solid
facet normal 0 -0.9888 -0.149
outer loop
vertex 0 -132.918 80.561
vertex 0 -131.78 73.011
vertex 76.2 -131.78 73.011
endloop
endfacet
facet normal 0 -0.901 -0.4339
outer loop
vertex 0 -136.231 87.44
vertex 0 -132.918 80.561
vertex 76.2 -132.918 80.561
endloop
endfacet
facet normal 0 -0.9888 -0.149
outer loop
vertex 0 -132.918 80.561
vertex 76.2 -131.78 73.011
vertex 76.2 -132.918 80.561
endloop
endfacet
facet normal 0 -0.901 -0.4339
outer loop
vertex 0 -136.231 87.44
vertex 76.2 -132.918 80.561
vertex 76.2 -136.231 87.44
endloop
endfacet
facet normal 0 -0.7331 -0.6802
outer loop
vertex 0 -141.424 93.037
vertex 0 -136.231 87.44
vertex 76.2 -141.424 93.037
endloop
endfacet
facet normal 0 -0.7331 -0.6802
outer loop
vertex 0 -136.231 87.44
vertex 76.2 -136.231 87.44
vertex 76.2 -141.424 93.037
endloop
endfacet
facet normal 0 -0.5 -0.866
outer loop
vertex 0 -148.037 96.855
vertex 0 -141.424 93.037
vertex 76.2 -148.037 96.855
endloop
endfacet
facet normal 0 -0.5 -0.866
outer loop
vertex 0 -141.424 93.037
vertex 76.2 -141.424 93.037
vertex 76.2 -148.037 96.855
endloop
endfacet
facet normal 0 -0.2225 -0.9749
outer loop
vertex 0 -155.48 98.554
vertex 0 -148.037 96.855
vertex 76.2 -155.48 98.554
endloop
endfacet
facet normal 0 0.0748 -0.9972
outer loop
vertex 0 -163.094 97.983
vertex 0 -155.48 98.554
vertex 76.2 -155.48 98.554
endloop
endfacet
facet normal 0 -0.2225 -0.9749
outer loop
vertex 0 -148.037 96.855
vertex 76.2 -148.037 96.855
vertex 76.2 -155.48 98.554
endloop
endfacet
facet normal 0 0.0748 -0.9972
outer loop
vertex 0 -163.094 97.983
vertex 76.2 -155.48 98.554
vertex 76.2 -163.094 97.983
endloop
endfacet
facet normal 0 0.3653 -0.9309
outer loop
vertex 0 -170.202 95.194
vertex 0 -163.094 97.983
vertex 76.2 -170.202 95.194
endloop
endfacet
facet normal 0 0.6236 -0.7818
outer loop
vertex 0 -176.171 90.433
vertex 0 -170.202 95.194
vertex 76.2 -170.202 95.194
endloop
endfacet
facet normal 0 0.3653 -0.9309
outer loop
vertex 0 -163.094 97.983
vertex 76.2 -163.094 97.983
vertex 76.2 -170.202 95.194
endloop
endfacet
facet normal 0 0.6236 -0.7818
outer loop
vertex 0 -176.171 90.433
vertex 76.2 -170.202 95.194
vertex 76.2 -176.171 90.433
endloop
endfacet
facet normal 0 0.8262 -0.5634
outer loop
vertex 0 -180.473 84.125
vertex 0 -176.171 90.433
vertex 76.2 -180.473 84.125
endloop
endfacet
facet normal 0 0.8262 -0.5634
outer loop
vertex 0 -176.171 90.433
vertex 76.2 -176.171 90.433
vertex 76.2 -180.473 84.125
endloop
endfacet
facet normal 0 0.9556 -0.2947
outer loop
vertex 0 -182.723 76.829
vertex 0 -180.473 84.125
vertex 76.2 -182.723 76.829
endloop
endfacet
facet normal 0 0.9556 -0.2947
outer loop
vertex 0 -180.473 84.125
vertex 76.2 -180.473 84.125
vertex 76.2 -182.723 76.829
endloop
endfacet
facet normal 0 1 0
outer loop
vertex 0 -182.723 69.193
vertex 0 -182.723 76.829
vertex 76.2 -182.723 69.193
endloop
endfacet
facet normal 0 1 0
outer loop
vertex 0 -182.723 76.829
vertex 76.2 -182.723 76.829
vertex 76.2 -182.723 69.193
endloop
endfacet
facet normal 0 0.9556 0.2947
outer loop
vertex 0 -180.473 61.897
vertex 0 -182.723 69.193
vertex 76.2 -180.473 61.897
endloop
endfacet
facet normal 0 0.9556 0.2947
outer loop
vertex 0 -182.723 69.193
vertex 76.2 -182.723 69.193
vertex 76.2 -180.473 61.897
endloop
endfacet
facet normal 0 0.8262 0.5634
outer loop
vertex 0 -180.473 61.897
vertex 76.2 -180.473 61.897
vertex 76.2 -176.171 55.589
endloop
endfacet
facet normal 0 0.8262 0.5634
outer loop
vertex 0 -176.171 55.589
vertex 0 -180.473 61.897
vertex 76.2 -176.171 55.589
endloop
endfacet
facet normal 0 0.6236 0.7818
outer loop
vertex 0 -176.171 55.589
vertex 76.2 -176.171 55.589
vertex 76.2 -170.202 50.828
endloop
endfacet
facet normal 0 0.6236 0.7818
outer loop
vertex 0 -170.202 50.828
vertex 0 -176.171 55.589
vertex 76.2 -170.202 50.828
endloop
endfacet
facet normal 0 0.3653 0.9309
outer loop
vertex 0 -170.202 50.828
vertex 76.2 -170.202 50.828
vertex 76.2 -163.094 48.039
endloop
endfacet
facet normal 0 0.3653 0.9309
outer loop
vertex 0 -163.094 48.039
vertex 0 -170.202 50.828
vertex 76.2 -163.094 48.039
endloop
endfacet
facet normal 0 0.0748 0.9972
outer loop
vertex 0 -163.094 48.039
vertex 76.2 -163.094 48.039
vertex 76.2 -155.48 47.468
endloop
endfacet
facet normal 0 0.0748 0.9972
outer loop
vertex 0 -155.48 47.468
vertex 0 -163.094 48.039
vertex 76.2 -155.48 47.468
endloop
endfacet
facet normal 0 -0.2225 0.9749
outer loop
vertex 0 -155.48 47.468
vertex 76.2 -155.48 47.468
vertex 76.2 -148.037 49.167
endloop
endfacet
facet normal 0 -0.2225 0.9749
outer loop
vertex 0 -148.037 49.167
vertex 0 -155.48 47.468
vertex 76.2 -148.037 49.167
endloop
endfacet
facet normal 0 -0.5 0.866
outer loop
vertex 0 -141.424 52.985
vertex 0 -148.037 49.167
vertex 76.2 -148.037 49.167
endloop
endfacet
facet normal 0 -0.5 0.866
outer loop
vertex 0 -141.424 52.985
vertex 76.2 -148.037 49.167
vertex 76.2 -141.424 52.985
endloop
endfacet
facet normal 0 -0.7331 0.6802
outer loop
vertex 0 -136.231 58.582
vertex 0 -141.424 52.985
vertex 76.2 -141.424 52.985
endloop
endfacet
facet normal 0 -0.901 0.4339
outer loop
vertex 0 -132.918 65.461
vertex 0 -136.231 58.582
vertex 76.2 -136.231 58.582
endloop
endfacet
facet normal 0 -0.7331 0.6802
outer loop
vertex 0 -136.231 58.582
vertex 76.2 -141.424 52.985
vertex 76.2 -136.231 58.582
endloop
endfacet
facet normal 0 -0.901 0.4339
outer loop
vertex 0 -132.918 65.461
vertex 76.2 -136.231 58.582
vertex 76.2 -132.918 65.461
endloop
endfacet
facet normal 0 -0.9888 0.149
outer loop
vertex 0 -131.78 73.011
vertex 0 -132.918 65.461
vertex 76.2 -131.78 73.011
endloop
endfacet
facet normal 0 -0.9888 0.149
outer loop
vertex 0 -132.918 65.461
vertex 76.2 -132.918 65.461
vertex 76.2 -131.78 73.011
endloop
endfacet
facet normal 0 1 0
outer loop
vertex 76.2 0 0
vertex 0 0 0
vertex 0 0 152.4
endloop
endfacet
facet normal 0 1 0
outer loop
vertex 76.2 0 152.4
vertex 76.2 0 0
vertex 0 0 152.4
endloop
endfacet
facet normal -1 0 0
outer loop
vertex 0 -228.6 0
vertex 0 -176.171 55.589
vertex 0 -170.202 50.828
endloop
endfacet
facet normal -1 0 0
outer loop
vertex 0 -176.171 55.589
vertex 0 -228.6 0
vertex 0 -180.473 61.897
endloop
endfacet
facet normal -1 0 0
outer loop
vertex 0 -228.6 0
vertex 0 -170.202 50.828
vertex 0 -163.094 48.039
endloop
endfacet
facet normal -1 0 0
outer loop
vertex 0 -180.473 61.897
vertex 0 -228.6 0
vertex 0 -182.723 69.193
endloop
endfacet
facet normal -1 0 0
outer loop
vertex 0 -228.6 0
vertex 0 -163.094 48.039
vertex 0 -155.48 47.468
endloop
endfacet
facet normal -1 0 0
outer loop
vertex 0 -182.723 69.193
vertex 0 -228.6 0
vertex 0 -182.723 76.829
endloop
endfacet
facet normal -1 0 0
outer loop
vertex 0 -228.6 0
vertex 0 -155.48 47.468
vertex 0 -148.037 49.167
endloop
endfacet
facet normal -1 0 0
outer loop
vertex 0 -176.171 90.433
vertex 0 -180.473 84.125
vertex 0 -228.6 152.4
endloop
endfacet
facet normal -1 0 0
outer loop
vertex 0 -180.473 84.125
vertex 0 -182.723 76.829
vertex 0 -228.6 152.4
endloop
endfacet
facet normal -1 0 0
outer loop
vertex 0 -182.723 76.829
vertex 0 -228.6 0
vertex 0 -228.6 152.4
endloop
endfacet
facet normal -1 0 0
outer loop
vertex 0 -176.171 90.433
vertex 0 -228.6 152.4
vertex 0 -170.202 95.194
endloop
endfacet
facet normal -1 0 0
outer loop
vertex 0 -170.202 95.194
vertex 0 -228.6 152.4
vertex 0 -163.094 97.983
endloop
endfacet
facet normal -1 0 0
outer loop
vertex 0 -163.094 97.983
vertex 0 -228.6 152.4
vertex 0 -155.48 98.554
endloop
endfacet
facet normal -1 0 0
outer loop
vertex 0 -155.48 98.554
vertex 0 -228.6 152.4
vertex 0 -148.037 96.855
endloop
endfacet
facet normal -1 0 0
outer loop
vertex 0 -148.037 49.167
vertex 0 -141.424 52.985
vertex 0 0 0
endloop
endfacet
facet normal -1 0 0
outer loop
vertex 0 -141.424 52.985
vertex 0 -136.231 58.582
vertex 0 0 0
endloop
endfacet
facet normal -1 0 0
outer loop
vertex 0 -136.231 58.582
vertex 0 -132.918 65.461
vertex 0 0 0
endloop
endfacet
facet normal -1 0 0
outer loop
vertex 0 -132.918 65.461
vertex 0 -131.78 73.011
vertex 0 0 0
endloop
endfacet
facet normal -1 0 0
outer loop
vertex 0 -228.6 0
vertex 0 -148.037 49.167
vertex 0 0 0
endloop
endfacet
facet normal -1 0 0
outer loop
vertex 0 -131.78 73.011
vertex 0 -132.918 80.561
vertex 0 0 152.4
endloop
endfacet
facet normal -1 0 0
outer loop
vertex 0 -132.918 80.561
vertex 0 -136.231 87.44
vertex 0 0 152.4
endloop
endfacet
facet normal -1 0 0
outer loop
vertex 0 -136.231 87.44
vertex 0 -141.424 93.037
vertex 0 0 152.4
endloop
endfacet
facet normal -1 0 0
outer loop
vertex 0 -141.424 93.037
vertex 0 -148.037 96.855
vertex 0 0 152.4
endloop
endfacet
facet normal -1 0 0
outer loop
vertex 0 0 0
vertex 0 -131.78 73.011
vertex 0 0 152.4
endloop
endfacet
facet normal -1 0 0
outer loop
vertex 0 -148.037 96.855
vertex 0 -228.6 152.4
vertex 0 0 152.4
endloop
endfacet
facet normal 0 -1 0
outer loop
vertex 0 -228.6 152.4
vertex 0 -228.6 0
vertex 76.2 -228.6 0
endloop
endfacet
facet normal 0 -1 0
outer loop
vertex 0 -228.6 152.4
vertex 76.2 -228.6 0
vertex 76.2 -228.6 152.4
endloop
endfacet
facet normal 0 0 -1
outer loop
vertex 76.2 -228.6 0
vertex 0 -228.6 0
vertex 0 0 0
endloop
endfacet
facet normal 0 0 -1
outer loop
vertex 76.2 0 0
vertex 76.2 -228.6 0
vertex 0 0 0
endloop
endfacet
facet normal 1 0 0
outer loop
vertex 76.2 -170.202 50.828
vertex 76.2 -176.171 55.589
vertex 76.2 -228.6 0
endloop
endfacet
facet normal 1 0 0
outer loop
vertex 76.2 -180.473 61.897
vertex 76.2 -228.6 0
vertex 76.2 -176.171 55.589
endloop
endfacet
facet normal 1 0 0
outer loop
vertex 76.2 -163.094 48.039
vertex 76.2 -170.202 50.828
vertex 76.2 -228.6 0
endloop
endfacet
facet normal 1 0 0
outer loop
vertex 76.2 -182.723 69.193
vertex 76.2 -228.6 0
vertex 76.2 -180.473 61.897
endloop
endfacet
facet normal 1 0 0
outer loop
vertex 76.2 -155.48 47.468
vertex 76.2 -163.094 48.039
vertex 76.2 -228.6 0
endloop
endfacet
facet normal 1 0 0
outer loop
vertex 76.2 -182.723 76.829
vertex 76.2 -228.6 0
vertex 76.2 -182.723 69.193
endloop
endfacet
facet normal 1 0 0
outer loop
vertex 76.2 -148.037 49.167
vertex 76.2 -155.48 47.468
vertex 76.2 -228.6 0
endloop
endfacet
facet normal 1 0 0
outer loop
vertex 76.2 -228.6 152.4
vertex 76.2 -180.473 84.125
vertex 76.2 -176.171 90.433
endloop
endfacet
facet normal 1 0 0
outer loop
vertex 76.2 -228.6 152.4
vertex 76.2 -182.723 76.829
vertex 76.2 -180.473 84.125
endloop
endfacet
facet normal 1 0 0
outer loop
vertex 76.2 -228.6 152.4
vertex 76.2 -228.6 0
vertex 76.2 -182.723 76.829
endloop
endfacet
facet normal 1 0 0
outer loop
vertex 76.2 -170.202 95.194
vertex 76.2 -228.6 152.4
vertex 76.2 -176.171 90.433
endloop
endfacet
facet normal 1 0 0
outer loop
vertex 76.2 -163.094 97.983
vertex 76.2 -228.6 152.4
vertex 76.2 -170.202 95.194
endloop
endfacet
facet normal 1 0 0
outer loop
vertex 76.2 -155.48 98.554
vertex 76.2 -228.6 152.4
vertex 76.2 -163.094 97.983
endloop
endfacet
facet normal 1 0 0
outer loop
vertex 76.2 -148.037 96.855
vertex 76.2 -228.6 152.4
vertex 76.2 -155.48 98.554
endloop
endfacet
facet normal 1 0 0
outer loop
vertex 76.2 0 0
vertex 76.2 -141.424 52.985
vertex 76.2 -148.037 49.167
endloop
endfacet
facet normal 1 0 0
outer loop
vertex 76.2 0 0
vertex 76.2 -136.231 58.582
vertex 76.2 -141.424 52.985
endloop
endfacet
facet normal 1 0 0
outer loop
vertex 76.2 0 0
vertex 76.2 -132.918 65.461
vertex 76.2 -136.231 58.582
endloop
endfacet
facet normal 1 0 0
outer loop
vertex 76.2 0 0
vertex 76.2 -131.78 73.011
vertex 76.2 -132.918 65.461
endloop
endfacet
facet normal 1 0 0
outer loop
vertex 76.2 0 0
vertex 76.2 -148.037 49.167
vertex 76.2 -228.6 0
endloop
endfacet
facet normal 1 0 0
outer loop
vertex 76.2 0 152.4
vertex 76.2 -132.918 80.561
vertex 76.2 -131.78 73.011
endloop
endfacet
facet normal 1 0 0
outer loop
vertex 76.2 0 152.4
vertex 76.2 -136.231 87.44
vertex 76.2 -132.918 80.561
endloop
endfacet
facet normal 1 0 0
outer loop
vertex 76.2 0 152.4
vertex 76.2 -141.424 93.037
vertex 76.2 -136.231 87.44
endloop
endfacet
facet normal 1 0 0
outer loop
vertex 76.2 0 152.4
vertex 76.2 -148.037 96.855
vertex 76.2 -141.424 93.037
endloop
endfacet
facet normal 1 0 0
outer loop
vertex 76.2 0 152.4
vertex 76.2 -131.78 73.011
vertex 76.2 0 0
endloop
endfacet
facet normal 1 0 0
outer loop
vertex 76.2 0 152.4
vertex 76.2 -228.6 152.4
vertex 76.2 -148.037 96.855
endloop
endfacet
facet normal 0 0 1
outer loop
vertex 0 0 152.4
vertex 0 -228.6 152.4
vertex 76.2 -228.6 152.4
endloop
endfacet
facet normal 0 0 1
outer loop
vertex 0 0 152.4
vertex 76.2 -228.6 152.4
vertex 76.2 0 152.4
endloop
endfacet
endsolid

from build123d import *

# Parameters (mm, degrees)
F0_W     = 228.6
F0_H     = 152.4
F1_DEPTH = 76.2
F2_R     = 25.614601
F3_DEPTH = 76.2


with BuildPart() as f1:
    # F0 (on Right) → F1 (new body)
    with BuildSketch(Plane.YZ):
        with Locations((-114.3, 76.2)):
            Rectangle(F0_W, F0_H)
    extrude(amount=F1_DEPTH)

    # F2 (on face) → F3 (cut)
    with BuildSketch(Plane.YZ.offset(76.2)):
        with Locations((-157.394603, 73.01107)):
            Circle(F2_R)
    extrude(amount=-F3_DEPTH, mode=Mode.SUBTRACT)


solid = f1.part
